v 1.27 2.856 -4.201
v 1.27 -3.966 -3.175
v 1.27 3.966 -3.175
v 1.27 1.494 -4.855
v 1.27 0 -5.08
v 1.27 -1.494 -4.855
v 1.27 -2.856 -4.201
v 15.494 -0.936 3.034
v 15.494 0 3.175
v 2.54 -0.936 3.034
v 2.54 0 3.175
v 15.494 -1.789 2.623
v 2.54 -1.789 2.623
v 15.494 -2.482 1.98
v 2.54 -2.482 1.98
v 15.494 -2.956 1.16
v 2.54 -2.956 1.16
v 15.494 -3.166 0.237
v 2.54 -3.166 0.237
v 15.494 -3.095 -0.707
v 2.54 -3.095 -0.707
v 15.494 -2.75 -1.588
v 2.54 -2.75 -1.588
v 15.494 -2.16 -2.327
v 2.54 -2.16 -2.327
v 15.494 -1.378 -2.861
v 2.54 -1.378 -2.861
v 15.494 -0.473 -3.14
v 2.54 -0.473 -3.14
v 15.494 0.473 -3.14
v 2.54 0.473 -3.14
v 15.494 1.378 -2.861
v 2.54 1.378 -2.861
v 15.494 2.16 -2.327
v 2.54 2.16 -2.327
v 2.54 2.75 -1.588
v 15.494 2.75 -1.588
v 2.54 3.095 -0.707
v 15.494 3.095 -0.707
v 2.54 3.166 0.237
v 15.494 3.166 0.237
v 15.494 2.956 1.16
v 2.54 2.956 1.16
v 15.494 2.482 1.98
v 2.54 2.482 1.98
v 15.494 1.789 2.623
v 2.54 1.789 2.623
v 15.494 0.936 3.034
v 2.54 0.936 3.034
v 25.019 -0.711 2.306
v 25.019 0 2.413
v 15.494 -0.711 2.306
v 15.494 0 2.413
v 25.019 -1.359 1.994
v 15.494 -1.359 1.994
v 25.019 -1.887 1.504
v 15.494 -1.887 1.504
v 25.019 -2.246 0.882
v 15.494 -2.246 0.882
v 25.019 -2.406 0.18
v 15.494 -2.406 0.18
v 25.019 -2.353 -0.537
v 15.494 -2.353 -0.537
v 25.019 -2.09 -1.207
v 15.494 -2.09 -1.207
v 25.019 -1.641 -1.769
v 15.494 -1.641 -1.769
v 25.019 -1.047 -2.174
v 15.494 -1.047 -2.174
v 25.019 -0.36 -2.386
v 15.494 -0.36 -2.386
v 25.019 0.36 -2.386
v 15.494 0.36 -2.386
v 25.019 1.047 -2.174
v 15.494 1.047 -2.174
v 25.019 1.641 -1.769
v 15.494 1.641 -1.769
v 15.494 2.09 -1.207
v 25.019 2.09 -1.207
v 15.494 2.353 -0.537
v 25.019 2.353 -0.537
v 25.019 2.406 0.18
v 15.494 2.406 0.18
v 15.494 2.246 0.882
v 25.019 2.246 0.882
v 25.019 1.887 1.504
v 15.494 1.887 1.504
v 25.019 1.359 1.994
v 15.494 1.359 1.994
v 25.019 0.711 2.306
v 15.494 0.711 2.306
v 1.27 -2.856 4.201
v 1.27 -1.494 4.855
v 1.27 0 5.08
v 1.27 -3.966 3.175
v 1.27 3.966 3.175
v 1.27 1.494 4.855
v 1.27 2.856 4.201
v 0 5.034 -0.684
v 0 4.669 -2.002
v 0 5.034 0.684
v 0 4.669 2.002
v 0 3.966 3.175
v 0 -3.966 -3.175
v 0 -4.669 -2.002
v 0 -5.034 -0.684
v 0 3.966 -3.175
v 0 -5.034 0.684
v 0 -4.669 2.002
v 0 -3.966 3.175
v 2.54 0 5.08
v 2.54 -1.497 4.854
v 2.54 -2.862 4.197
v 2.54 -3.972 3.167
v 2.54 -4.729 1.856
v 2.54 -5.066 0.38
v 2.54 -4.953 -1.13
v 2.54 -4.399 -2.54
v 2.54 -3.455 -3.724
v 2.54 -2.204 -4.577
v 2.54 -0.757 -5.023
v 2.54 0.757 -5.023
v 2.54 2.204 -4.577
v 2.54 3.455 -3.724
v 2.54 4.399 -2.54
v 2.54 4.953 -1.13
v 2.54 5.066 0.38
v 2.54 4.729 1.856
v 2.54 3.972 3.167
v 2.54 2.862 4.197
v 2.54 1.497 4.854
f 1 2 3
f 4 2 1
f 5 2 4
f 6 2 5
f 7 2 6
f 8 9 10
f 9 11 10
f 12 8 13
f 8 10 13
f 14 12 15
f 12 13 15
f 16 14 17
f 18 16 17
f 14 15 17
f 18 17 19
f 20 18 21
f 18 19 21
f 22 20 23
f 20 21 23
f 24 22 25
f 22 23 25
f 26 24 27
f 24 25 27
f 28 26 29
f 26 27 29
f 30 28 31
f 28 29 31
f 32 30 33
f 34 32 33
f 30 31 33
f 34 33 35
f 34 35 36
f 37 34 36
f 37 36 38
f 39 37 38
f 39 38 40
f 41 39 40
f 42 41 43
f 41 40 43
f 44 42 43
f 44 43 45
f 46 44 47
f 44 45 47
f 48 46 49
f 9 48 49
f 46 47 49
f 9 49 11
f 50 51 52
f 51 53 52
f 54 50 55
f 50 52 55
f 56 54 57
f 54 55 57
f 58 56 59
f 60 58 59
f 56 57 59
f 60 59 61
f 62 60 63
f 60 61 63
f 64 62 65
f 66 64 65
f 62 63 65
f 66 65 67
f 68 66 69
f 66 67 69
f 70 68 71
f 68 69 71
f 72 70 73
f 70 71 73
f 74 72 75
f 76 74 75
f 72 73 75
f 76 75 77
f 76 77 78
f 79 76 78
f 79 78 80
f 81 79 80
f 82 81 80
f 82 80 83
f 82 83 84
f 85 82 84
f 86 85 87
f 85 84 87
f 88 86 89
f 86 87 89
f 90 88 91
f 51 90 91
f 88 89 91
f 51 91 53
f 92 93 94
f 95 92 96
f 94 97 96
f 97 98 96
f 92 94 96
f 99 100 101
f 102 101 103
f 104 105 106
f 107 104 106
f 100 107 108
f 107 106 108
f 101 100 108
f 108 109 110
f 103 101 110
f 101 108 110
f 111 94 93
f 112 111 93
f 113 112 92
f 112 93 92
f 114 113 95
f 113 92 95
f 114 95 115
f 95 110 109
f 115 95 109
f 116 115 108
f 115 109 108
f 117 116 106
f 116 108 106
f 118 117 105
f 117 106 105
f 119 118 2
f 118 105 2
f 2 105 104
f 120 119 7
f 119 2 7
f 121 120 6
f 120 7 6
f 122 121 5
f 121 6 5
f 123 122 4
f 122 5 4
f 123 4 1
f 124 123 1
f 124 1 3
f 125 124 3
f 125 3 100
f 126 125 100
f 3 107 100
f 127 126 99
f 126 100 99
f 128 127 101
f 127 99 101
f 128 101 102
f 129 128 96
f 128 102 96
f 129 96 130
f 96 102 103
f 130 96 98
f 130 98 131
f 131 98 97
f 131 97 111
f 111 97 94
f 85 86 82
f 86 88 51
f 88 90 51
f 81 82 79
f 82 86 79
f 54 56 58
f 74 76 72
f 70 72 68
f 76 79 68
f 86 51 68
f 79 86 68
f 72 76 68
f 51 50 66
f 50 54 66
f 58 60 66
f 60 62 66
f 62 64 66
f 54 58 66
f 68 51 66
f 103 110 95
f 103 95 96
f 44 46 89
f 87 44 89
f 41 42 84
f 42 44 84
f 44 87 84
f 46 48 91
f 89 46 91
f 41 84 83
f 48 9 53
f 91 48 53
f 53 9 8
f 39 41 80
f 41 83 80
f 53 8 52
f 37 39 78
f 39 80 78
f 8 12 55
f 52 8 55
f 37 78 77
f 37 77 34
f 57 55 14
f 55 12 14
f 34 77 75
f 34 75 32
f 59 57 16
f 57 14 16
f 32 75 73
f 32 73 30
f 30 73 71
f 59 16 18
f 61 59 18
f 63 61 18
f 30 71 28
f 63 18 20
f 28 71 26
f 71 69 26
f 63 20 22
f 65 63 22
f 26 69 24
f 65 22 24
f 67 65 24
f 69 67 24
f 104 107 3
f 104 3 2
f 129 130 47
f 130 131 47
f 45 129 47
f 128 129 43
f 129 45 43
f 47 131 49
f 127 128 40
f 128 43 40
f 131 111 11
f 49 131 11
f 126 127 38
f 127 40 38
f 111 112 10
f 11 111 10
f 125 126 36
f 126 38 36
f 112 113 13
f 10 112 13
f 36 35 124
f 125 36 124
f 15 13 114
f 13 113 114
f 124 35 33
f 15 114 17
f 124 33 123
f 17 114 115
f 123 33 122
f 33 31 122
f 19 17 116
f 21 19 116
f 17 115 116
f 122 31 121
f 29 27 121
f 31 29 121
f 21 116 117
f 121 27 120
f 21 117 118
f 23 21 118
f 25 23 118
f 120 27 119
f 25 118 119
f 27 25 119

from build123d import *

# Parameters (mm, degrees)
F4_DEPTH = 3.81


with BuildPart() as f1:
    # F0 (on Front) → F1 (revolve)
    with BuildSketch(Plane.XZ):
        Polygon((0, 5.08), (0, 0), (25.019, 0), (25.019, 2.413), (15.494, 2.413), (15.494, 3.175), (2.54, 3.175), (2.54, 5.08), align=None)
    revolve(axis=Axis((12.5095, 0, 0), (1, 0, 0)))

    # F3 (on offset) → F4 (cut)
    with BuildSketch(Plane.YZ.offset(-2.54)):
        Polygon((-5.874861, 3.175), (0, 3.175), (5.874861, 3.175), (5.874861, 6.309091), (-5.874861, 6.309091), align=None)
        Polygon((5.874861, -3.175), (0, -3.175), (-5.874861, -3.175), (-5.874861, -6.309091), (5.874861, -6.309091), align=None)
    extrude(amount=F4_DEPTH, mode=Mode.SUBTRACT)


solid = f1.part
